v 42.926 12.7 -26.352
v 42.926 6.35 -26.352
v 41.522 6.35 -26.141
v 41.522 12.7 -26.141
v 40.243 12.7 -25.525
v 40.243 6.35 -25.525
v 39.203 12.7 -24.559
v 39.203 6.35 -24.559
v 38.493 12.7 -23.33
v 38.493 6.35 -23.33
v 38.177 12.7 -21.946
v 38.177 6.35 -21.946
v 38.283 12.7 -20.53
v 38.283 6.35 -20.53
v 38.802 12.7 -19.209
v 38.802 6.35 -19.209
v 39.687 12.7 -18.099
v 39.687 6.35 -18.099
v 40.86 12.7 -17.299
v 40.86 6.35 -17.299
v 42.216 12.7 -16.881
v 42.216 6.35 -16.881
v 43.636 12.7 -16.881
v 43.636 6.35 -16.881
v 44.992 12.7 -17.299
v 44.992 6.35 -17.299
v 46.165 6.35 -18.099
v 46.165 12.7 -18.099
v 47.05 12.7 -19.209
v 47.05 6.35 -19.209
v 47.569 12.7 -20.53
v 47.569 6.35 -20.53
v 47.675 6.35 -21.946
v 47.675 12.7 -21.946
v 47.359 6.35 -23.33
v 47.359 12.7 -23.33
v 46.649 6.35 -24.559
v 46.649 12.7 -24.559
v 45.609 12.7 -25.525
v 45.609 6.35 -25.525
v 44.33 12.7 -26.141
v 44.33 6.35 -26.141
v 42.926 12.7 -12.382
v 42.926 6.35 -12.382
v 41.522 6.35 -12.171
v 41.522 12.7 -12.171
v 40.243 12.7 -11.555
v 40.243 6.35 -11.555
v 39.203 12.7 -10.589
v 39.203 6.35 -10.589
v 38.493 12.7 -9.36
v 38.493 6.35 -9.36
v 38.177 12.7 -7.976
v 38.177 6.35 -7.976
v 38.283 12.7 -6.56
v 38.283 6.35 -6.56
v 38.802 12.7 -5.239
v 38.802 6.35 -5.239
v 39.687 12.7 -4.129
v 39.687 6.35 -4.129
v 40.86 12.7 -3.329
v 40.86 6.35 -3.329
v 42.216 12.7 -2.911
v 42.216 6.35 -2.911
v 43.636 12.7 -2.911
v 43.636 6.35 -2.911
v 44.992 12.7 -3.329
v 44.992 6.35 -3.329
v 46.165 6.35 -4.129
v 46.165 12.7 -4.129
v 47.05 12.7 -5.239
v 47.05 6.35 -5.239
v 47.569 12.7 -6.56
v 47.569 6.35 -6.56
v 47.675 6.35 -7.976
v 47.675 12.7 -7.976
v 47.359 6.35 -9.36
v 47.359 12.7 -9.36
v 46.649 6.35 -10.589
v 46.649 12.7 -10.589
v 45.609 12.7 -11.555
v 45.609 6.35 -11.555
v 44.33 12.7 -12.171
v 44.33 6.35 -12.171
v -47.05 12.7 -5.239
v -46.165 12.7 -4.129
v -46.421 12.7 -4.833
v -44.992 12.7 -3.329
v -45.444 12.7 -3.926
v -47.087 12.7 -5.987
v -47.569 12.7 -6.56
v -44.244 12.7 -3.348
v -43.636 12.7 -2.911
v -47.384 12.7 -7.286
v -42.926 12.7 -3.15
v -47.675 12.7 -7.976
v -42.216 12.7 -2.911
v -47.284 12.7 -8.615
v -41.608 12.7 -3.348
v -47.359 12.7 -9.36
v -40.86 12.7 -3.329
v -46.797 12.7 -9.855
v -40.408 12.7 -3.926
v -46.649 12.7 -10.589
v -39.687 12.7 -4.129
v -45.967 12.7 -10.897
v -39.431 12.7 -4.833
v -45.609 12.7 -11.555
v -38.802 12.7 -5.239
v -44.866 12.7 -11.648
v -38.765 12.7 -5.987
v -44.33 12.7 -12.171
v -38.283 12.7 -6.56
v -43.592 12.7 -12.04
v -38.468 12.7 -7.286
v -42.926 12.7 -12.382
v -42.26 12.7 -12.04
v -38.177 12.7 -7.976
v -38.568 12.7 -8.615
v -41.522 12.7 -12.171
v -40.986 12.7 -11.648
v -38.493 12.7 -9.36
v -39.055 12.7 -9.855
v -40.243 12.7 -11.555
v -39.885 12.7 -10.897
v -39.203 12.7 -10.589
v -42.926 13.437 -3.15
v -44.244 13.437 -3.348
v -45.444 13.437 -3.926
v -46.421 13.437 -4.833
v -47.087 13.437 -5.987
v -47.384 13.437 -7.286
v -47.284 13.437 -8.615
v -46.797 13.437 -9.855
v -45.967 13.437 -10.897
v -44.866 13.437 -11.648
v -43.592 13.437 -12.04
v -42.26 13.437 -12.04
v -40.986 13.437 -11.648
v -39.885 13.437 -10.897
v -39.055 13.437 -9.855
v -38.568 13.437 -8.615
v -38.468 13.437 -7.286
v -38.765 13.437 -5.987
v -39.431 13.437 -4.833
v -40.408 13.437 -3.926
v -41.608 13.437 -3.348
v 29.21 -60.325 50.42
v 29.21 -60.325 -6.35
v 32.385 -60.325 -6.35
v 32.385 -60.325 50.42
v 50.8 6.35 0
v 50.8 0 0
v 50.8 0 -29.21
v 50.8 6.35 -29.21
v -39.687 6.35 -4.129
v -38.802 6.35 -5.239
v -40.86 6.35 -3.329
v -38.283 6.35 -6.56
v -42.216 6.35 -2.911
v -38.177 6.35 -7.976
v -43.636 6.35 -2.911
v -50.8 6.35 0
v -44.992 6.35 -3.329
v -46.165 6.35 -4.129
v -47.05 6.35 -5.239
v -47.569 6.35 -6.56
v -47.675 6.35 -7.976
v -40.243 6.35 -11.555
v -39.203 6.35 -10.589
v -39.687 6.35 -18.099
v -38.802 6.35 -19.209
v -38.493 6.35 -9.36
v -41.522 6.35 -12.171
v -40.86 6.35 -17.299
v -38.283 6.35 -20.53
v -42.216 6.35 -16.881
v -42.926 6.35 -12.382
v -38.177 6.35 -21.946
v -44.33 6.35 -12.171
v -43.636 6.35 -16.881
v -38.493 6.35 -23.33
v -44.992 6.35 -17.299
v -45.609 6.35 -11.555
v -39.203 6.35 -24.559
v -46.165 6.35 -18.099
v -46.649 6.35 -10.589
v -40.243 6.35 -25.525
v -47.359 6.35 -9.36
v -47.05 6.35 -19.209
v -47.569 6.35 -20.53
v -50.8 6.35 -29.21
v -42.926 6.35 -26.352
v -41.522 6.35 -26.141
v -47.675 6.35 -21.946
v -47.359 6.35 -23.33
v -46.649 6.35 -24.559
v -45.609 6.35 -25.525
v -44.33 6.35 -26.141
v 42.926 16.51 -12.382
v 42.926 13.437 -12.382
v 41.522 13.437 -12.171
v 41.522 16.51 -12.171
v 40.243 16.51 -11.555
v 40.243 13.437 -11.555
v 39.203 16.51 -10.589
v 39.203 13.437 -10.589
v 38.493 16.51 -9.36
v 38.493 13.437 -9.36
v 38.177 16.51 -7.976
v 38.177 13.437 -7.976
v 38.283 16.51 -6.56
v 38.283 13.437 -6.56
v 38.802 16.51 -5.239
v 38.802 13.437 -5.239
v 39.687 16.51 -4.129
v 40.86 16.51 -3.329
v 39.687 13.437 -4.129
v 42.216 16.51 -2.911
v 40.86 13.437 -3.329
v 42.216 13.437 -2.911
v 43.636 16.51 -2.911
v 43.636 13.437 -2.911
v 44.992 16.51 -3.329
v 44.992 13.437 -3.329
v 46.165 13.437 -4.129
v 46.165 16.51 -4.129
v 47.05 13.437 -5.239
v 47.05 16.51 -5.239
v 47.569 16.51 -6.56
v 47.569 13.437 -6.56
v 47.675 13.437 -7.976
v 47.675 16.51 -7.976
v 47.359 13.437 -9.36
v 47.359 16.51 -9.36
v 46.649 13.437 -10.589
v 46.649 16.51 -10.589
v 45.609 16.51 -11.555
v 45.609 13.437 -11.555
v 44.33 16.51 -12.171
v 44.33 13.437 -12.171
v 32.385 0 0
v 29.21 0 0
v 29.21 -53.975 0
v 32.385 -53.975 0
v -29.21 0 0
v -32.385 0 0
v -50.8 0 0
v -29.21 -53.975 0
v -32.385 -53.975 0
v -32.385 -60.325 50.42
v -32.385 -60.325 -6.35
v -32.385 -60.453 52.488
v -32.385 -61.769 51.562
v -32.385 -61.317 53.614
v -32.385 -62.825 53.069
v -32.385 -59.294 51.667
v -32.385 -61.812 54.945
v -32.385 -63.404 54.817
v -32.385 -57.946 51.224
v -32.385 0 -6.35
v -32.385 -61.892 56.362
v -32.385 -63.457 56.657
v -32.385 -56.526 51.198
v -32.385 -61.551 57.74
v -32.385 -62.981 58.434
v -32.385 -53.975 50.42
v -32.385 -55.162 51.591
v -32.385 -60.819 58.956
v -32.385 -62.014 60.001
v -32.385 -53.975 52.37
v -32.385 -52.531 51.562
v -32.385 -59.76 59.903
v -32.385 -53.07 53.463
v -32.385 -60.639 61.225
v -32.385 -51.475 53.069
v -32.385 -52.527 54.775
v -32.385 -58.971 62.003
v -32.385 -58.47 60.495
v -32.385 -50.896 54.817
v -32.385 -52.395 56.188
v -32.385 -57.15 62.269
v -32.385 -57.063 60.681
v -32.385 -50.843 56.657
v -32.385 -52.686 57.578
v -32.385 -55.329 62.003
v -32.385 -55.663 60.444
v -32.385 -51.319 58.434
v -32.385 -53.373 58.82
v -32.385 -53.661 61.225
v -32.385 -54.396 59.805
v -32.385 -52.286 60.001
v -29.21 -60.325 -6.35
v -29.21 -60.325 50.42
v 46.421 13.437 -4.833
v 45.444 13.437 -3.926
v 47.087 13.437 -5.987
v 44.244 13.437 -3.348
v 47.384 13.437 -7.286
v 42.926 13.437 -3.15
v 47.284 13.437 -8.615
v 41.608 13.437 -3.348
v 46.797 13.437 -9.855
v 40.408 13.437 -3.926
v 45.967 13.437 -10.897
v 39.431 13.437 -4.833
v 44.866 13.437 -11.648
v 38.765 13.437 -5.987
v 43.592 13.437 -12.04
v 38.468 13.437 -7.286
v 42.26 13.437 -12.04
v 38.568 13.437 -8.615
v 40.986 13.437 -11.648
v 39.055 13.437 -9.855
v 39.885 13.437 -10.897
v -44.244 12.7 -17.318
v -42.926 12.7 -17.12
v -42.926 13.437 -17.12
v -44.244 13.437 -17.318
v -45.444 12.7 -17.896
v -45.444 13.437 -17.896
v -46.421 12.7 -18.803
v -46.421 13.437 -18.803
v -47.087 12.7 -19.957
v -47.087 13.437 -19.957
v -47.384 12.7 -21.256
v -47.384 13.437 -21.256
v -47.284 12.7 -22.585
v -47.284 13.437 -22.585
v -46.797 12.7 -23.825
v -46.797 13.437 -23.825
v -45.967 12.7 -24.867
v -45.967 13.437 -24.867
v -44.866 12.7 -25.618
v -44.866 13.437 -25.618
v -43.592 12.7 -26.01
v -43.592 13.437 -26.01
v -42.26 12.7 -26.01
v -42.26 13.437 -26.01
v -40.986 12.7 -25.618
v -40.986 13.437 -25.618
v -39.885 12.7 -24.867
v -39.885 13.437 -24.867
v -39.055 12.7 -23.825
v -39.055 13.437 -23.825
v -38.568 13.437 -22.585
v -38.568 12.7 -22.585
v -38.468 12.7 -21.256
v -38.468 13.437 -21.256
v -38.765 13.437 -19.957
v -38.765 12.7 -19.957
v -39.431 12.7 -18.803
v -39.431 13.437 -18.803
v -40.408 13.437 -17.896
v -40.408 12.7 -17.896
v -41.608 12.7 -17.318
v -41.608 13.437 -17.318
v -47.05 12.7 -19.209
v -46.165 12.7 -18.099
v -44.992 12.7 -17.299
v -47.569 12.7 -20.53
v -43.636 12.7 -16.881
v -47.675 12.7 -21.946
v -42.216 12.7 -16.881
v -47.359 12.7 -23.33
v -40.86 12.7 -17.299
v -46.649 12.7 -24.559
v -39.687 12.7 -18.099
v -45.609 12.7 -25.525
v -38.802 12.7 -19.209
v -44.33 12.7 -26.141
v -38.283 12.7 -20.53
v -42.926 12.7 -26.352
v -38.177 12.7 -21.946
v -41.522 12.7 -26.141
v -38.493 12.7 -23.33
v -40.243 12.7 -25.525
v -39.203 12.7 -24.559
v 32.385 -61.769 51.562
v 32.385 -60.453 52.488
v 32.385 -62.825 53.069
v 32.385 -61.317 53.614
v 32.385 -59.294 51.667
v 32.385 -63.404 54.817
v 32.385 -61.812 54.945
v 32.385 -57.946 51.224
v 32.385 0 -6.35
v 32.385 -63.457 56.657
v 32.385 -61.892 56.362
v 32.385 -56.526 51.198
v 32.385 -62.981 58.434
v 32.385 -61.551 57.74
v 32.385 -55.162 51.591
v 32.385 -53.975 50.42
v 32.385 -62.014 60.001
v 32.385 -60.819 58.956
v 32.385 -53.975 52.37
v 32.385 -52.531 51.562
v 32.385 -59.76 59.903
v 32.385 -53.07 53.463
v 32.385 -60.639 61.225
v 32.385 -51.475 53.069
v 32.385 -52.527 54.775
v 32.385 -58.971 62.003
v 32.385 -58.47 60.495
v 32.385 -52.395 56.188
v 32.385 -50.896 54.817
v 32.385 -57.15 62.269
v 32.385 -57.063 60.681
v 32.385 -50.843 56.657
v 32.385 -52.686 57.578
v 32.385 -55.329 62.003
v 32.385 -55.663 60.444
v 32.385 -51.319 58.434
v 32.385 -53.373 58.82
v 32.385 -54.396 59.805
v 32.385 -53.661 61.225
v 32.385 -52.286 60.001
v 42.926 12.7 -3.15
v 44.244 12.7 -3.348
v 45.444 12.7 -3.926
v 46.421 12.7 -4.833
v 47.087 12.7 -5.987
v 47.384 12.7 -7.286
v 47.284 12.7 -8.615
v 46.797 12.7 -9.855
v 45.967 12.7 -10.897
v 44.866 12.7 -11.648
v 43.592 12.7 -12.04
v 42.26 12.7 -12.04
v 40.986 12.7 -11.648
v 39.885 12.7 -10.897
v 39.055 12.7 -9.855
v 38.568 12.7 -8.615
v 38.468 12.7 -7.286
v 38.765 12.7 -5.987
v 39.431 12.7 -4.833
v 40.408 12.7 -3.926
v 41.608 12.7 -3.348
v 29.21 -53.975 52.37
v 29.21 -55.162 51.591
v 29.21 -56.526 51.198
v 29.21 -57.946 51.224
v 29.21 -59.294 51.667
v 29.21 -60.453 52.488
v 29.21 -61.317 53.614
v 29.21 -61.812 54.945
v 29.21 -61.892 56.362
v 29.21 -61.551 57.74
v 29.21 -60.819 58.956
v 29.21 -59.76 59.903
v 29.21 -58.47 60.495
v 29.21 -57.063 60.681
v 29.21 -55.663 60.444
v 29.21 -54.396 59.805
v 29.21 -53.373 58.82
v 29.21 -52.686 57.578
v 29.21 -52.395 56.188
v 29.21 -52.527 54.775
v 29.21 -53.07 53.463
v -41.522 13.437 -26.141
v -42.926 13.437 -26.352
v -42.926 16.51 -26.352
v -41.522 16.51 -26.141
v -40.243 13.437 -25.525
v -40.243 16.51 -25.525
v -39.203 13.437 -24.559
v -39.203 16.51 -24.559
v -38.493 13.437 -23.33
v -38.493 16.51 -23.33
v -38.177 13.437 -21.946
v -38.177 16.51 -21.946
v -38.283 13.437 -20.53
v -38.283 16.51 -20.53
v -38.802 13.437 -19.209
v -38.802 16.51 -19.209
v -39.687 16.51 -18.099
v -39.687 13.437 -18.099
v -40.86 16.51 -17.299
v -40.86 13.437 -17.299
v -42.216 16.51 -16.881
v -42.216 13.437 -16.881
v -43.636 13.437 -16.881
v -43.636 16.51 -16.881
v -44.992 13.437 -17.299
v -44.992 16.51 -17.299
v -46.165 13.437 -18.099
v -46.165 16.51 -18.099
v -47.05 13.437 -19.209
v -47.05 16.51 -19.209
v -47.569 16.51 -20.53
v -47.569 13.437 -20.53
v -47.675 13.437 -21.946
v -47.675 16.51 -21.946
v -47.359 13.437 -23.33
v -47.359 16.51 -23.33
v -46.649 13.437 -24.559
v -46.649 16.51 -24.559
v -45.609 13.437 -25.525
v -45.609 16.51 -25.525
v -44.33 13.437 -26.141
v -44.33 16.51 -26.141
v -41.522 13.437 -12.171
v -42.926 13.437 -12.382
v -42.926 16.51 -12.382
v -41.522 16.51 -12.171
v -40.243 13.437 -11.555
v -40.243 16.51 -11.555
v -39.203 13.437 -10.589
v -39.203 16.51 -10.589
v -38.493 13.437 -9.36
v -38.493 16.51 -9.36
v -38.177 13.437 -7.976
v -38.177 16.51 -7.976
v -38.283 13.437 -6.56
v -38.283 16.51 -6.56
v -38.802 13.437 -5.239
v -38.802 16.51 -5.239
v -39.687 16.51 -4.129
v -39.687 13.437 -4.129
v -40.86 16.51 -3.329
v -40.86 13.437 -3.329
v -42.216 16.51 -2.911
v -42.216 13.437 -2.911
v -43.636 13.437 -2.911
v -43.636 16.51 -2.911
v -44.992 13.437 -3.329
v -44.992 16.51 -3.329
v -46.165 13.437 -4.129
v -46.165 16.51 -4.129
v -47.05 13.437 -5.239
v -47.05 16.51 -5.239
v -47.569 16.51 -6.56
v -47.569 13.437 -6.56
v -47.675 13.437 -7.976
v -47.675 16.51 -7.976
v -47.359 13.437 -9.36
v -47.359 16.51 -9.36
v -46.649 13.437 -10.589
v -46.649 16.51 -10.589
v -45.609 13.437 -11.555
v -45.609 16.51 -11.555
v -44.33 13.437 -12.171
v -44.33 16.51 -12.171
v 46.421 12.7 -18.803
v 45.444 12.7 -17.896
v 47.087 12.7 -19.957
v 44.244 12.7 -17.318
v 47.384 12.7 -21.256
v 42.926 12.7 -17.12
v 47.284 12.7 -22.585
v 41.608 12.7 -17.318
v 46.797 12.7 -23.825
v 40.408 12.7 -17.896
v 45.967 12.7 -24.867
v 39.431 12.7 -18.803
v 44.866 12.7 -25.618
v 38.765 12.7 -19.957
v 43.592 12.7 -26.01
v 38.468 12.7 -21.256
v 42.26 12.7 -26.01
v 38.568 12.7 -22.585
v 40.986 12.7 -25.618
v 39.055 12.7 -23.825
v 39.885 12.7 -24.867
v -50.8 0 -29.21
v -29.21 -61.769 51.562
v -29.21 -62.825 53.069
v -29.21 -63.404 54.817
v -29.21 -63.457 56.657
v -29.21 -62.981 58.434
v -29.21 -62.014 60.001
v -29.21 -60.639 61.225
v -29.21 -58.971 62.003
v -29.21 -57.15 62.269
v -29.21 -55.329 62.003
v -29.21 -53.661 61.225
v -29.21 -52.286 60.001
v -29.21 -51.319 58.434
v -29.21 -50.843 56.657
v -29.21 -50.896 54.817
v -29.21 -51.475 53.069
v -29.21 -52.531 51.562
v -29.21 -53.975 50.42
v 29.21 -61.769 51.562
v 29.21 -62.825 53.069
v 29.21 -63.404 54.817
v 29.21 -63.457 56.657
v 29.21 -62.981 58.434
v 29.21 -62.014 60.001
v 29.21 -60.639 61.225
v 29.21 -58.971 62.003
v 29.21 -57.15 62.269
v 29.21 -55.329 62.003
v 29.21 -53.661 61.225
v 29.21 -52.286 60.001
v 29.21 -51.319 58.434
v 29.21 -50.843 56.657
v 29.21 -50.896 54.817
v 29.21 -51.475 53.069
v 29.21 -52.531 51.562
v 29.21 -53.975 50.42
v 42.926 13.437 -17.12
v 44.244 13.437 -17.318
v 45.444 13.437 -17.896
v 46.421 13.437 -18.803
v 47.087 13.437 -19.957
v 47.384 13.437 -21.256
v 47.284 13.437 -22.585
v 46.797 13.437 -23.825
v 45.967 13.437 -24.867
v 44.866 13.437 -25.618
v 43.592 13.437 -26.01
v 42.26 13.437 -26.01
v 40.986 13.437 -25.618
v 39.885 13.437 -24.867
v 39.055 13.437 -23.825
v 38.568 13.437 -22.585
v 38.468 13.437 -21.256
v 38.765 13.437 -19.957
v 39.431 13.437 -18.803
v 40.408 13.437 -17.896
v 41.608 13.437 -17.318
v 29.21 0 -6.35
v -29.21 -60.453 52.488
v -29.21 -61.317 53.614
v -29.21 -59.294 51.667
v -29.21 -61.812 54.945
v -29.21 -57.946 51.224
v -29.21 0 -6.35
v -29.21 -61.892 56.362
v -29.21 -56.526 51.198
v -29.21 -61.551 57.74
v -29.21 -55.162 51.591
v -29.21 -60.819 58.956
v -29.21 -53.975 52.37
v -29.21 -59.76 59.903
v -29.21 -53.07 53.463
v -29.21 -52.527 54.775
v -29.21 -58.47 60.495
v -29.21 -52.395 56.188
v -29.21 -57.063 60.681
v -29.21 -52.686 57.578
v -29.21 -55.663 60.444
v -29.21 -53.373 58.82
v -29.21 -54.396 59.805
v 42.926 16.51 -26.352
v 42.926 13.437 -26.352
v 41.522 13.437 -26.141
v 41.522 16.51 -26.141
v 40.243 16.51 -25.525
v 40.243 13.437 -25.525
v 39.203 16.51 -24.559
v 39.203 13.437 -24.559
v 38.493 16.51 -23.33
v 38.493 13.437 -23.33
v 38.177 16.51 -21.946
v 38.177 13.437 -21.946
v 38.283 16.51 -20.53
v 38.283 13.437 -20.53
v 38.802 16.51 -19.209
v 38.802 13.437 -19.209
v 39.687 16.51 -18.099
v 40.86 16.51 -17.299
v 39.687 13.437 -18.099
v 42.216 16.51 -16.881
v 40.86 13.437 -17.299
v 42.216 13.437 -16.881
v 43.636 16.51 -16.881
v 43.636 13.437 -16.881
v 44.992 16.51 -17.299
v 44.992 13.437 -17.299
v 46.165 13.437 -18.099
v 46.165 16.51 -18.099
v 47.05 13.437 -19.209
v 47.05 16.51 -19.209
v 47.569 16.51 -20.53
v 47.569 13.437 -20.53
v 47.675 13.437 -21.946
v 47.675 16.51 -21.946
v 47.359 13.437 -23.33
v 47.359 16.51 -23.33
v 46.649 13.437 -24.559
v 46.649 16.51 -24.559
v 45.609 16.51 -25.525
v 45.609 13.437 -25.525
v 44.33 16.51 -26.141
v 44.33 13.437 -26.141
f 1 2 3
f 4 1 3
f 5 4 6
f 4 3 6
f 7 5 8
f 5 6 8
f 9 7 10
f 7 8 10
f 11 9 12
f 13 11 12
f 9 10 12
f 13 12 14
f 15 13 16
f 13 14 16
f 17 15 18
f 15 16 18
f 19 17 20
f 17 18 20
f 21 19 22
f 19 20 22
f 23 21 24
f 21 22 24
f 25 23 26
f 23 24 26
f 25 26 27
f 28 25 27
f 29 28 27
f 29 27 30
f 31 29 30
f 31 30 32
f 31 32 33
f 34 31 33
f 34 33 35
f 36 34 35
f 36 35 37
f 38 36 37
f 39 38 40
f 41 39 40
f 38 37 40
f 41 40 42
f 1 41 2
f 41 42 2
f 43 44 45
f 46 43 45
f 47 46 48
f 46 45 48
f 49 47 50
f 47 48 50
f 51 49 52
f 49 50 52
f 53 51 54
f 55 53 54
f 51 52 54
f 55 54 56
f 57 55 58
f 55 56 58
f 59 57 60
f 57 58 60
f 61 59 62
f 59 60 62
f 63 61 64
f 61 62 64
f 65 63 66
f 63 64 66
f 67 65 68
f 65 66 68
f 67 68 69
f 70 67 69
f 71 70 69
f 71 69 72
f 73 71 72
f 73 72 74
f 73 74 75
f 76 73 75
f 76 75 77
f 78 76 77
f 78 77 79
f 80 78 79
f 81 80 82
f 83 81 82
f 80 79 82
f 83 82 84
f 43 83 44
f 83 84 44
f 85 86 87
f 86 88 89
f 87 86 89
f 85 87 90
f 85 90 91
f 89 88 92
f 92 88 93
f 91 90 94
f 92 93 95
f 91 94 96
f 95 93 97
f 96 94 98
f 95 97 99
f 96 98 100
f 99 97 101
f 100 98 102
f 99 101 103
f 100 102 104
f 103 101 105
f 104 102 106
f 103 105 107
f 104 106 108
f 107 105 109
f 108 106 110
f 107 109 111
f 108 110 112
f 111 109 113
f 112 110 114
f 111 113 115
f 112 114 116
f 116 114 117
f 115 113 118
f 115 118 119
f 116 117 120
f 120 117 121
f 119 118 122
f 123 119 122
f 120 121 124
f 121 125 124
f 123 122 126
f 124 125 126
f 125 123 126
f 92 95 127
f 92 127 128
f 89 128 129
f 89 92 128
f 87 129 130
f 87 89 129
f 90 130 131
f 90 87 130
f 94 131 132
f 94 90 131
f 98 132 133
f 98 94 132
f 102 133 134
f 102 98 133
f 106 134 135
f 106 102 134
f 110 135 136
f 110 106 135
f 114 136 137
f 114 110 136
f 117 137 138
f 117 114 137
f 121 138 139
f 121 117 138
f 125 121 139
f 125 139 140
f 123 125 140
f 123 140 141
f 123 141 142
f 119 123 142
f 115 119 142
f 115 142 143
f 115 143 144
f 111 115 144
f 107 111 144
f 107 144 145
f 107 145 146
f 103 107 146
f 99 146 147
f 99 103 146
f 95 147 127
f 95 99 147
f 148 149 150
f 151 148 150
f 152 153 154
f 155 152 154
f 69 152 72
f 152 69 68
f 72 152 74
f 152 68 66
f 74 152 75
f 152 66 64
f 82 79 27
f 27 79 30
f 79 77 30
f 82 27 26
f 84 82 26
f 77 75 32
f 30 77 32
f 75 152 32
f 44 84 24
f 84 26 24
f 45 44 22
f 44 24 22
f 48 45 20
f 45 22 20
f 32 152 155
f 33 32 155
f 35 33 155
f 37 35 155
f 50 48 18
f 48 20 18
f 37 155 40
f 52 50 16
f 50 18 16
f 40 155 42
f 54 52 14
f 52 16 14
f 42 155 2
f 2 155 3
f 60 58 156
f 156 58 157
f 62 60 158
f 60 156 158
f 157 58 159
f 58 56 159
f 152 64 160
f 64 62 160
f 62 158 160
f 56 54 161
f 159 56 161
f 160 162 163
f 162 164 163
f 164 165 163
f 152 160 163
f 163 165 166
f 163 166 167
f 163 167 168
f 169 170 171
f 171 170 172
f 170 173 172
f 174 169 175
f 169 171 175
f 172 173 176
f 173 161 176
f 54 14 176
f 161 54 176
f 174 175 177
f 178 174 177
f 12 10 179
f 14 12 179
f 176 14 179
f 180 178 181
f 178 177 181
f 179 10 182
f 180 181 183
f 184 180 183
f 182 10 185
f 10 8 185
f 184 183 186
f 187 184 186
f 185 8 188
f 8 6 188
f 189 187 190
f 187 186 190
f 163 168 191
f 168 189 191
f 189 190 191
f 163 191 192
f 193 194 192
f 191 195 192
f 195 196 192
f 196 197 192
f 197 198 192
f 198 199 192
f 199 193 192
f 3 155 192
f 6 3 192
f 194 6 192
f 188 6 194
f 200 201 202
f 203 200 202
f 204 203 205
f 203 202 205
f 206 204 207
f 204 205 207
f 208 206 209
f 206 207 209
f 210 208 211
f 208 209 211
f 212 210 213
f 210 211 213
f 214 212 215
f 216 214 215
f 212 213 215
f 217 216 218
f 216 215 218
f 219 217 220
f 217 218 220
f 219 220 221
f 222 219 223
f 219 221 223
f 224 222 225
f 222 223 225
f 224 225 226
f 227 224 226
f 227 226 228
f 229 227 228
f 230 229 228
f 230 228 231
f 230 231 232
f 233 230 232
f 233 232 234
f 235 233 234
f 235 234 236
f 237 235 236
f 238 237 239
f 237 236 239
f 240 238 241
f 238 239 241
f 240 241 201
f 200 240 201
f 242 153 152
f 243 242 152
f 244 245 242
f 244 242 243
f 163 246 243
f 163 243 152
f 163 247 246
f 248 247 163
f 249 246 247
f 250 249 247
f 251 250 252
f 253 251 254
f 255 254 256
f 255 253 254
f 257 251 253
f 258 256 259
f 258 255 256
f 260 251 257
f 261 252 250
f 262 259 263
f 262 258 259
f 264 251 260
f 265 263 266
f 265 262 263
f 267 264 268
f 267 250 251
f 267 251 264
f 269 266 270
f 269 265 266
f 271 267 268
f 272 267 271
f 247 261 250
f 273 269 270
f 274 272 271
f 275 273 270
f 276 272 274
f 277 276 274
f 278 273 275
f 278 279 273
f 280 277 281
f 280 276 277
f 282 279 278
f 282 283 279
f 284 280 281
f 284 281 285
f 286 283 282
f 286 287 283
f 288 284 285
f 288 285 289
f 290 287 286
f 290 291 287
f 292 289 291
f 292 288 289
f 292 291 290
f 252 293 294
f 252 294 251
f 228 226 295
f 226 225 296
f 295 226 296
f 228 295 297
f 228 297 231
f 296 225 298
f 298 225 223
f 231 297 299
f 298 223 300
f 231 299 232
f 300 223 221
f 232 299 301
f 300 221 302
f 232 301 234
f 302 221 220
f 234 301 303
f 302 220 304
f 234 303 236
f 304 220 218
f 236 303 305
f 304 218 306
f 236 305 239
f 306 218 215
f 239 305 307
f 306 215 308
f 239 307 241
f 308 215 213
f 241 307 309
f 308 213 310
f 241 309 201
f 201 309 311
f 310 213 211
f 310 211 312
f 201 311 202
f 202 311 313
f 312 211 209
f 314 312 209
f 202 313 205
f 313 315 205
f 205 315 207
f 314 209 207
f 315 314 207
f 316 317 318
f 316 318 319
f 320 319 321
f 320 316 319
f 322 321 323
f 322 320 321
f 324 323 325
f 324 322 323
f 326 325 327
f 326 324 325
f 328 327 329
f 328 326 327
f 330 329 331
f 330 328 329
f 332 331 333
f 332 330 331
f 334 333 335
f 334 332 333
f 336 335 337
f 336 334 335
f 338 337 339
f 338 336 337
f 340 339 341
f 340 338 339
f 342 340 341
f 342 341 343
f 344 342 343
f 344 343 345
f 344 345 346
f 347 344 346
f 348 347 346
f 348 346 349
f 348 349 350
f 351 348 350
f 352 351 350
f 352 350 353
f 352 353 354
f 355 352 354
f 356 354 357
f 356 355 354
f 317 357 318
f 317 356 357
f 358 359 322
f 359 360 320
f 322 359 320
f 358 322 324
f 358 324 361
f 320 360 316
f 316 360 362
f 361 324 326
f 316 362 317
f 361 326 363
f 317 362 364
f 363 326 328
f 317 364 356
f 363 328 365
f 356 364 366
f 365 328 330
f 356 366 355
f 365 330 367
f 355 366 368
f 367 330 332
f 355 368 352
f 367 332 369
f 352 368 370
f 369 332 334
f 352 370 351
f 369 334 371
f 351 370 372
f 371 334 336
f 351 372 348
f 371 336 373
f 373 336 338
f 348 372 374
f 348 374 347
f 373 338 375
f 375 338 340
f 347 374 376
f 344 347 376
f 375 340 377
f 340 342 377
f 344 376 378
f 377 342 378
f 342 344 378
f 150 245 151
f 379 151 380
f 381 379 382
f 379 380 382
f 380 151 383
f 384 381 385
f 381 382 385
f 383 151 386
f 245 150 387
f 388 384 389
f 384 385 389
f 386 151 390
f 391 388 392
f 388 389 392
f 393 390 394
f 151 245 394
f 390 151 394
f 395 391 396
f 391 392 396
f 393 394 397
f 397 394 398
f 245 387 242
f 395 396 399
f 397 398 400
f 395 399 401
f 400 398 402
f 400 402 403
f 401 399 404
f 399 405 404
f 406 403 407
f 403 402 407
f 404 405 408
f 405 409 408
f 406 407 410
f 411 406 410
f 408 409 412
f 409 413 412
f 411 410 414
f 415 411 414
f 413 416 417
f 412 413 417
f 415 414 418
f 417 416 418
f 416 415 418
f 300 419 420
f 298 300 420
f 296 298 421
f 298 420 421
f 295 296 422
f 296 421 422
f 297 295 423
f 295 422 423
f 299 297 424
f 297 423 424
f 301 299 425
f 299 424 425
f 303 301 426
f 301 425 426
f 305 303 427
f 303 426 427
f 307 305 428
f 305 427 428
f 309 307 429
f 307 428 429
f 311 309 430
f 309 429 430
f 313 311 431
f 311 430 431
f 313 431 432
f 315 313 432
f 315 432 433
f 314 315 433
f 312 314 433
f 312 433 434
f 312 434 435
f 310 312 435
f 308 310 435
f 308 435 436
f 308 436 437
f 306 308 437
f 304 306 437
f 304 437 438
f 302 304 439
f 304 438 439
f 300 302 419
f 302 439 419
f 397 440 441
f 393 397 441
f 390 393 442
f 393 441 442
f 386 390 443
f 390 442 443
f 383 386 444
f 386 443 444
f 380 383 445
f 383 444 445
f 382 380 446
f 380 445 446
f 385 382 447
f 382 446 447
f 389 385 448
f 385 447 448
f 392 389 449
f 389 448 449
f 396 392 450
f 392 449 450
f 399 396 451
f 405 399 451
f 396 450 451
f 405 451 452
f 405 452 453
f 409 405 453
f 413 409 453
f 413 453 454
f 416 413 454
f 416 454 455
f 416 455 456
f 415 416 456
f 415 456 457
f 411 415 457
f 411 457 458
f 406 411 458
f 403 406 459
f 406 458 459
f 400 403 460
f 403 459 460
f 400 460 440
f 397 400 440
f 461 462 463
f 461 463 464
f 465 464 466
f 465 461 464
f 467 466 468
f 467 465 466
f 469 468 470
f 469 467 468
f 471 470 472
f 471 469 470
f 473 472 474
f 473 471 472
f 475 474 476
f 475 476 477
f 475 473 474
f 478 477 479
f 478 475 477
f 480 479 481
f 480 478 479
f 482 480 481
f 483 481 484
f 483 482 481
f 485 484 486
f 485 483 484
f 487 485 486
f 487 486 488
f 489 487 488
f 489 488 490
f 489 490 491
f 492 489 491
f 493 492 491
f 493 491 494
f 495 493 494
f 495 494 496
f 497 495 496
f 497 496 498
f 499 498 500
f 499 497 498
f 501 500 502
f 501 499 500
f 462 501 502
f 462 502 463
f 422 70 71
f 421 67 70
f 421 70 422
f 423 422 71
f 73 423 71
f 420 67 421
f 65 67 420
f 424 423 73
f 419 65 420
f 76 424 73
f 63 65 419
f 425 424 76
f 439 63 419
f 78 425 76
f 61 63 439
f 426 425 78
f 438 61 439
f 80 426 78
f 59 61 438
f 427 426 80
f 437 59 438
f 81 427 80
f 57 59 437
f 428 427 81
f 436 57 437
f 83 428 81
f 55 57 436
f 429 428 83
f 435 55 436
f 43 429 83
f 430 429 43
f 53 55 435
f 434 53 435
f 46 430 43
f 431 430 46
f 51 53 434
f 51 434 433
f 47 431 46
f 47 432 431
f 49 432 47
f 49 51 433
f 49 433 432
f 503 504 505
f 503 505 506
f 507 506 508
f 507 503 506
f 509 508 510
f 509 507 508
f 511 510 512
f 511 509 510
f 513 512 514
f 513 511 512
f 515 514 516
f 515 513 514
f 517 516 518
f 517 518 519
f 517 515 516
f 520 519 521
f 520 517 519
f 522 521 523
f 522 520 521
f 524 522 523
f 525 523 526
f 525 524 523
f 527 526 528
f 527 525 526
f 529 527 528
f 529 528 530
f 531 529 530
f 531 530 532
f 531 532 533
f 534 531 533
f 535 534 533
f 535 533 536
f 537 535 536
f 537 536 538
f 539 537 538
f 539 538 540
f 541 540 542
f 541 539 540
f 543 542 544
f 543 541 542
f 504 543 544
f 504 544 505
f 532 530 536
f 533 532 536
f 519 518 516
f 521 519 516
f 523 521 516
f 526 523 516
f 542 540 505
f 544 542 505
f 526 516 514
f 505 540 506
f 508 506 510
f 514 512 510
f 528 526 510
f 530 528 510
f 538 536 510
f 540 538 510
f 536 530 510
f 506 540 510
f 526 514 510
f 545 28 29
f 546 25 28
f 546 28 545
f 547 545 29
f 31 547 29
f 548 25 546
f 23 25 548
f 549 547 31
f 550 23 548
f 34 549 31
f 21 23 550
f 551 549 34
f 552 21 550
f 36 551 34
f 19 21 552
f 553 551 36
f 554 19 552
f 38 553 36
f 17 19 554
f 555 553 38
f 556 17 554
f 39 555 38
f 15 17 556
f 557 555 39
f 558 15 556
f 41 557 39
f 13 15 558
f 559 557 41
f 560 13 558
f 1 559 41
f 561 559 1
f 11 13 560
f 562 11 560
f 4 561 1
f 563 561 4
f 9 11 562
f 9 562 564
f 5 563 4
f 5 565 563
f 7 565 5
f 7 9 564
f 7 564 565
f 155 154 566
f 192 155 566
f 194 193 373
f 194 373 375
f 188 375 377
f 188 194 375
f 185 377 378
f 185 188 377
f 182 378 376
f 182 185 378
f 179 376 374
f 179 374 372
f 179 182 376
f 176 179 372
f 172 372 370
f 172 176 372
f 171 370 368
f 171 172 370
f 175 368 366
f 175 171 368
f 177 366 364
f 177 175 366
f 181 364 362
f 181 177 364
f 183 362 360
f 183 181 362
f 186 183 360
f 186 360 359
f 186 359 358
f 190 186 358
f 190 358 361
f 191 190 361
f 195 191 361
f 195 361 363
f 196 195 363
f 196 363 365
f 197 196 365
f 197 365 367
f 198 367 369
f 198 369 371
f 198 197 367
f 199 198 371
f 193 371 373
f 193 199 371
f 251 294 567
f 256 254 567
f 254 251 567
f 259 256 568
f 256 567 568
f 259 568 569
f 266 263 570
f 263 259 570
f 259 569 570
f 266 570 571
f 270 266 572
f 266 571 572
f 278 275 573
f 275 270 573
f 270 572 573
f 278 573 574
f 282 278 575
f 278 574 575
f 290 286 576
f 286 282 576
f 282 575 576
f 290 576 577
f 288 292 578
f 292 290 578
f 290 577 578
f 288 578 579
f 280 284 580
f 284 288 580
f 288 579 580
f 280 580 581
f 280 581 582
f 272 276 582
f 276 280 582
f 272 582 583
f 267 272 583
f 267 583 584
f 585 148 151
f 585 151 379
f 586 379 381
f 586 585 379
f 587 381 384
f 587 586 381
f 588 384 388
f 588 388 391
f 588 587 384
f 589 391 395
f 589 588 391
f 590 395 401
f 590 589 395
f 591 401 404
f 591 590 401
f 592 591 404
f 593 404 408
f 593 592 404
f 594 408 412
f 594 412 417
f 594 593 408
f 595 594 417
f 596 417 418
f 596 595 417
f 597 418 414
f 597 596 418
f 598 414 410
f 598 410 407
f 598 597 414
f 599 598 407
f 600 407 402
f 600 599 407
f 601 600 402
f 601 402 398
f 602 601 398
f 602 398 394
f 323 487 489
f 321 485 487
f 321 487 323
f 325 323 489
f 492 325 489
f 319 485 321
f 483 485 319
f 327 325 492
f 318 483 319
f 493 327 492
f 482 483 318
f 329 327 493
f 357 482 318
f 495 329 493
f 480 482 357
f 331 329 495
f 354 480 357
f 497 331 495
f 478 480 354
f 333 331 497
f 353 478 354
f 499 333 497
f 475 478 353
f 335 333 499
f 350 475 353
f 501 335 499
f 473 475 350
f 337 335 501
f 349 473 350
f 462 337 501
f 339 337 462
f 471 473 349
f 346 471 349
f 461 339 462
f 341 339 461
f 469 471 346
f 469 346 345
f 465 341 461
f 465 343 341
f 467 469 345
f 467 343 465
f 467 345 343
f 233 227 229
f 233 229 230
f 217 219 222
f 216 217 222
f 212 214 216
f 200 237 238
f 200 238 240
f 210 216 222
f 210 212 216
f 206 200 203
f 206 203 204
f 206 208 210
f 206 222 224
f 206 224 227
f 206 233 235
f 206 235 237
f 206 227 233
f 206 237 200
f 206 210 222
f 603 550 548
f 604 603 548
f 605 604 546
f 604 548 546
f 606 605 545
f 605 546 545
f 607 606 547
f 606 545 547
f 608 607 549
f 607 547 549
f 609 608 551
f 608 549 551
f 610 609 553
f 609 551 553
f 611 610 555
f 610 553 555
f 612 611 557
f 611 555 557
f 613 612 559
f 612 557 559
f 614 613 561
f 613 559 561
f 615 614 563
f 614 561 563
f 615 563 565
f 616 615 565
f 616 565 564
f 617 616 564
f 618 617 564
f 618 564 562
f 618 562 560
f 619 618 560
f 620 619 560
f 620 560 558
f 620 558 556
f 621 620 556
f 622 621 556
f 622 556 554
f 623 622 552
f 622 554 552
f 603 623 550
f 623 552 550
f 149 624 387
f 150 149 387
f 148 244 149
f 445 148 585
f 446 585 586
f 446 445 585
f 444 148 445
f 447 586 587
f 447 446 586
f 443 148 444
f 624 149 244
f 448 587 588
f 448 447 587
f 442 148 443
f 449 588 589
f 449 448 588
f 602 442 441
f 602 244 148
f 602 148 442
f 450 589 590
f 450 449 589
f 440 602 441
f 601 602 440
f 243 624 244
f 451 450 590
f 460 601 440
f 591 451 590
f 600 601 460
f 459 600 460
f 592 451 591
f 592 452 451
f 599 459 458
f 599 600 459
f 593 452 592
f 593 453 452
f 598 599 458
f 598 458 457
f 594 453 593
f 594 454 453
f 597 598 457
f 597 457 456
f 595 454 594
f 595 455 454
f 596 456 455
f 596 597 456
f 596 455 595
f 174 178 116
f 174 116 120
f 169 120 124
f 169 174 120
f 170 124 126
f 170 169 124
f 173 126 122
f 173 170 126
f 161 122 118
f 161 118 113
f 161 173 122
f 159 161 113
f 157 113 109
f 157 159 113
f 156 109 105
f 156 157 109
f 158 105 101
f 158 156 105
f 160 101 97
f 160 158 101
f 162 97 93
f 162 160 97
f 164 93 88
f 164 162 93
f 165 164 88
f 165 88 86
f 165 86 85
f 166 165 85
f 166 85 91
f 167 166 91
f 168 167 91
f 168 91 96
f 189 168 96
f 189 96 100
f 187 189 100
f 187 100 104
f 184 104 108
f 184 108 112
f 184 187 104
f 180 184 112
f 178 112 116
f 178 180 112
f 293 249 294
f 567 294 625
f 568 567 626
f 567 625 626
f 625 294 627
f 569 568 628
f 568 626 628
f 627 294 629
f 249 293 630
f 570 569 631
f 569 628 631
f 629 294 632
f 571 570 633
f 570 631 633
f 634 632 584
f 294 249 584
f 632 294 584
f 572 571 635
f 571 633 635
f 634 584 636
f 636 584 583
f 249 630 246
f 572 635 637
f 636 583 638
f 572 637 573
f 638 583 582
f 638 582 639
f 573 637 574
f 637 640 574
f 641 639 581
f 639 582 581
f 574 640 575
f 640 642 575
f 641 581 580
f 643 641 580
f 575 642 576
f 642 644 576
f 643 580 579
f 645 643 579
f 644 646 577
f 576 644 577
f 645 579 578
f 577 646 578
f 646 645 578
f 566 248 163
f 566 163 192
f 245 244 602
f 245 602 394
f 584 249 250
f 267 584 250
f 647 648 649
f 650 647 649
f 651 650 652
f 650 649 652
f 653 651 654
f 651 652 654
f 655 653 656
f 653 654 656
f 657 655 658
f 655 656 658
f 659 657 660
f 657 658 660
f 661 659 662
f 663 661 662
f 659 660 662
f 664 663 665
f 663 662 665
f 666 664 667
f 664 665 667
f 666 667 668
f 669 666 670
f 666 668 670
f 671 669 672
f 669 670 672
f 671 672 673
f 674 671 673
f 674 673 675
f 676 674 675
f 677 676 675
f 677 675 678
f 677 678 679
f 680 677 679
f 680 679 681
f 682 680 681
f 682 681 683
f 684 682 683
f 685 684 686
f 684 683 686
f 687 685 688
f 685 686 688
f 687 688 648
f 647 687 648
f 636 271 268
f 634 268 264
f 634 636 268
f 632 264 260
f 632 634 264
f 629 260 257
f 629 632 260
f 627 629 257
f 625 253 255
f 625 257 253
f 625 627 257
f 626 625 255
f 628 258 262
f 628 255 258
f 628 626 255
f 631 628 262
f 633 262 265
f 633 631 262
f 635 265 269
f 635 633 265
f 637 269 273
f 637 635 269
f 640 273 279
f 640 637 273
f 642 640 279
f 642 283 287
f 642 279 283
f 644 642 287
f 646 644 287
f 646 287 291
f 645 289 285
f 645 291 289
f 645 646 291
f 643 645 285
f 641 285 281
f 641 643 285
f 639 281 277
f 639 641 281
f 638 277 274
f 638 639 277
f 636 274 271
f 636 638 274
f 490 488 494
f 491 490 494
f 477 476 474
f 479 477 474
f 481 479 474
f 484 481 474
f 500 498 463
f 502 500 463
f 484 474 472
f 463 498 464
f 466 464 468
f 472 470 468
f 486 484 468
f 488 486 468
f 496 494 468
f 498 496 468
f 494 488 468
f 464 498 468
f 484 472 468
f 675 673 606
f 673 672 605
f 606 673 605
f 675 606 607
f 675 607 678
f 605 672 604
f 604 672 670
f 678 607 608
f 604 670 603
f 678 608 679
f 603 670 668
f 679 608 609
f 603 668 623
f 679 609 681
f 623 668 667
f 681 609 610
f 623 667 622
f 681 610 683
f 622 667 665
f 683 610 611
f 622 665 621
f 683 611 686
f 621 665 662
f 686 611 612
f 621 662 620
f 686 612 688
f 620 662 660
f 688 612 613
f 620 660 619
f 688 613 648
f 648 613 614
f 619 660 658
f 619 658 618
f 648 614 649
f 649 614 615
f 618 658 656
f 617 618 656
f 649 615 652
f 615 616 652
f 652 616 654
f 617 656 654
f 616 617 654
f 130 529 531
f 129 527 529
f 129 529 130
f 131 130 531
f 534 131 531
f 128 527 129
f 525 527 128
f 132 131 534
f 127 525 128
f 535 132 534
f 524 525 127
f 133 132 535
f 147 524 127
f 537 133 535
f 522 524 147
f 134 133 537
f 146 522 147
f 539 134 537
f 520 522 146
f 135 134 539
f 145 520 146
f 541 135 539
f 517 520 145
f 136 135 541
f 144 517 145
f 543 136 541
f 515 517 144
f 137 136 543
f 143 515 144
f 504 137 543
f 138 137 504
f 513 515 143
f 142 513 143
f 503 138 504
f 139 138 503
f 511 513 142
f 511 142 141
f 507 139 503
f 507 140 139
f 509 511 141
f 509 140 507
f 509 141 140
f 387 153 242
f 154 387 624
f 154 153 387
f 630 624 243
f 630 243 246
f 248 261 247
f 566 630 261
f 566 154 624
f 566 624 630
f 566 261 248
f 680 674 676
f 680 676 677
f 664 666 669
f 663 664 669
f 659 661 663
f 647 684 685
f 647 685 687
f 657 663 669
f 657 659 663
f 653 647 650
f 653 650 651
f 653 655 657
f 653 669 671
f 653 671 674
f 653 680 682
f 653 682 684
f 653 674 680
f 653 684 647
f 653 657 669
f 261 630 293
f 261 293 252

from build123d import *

# Parameters (mm, degrees)
SKETCH2_W           = 50.8
SKETCH2_H           = 29.21
BOSS_EXTRUDE1_DEPTH = 6.35
SKETCH4_R           = 4.7625
BOSS_EXTRUDE2_DEPTH = 6.35
SKETCH7_R           = 4.4704
BOSS_EXTRUDE3_DEPTH = 0.7366
SKETCH8_R           = 4.7625
BOSS_EXTRUDE4_DEPTH = 3.0734
SKETCH11_W          = 3.175
SKETCH11_H          = 6.35
BOSS_EXTRUDE5_DEPTH = 60.325
SKETCH12_W          = 3.175
SKETCH12_H          = 6.35
BOSS_EXTRUDE6_DEPTH = 55.91937
SKETCH13_R          = 6.35
SKETCH13_R_2        = 4.7625
BOSS_EXTRUDE8_DEPTH = 3.175
SKETCH17_R          = 4.7625
CUT_EXTRUDE3_DEPTH  = 3.175


with BuildPart() as part:
    # Sketch2 → Boss-Extrude1 (new body)
    with BuildSketch(Plane(origin=(0, 0, 0), x_dir=(1, 0, 0), z_dir=(0, 1, 0))):
        with Locations((25.4, 14.605)):
            Rectangle(SKETCH2_W, SKETCH2_H)
    boss_extrude1 = extrude(amount=BOSS_EXTRUDE1_DEPTH)

    # Sketch4 → Boss-Extrude2 (add)
    with BuildSketch(Plane(origin=(0, 6.35, 0), x_dir=(1, 0, 0), z_dir=(0, 1, 0))):
        with Locations(Location((42.926, 7.62, 0), (0, 0, 90))):
            Circle(SKETCH4_R)
        with Locations(Location((42.926, 21.59, 0), (0, 0, 90))):
            Circle(SKETCH4_R)
    boss_extrude2 = extrude(amount=BOSS_EXTRUDE2_DEPTH)

    # Sketch7 → Boss-Extrude3 (add)
    with BuildSketch(Plane(origin=(0, 12.7, 0), x_dir=(1, 0, 0), z_dir=(0, 1, 0))):
        with Locations(Location((42.926, 21.59, 0), (0, 0, 270))):
            Circle(SKETCH7_R)
        with Locations(Location((42.926, 7.62, 0), (0, 0, 270))):
            Circle(SKETCH7_R)
    boss_extrude3 = extrude(amount=BOSS_EXTRUDE3_DEPTH)

    # Sketch8 → Boss-Extrude4 (add)
    with BuildSketch(Plane(origin=(0, 13.4366, 0), x_dir=(1, 0, 0), z_dir=(0, 1, 0))):
        with Locations(Location((42.926, 21.59, 0), (0, 0, 90))):
            Circle(SKETCH8_R)
        with Locations(Location((42.926, 7.62, 0), (0, 0, 90))):
            Circle(SKETCH8_R)
    boss_extrude4 = extrude(amount=BOSS_EXTRUDE4_DEPTH)

    # Sketch11 → Boss-Extrude5 (add)
    with BuildSketch(Plane.XZ):
        with Locations((30.7975, -3.175)):
            Rectangle(SKETCH11_W, SKETCH11_H)
    boss_extrude5 = extrude(amount=BOSS_EXTRUDE5_DEPTH)

    # Sketch12 → Boss-Extrude6 (add)
    with BuildSketch(Plane.XY):
        with Locations((30.7975, -57.15)):
            Rectangle(SKETCH12_W, SKETCH12_H)
    boss_extrude6 = extrude(amount=BOSS_EXTRUDE6_DEPTH)

    # Sketch13 → Boss-Extrude8 (add)
    with BuildSketch(Plane.ZY.offset(-29.21)):
        with Locations((55.91937, -57.15)):
            Circle(SKETCH13_R)
        with Locations((55.91937, -57.15)):
            Circle(SKETCH13_R_2, mode=Mode.SUBTRACT)
    boss_extrude8 = extrude(amount=-BOSS_EXTRUDE8_DEPTH)

    # Sketch17 → Cut-Extrude3 (cut)
    with BuildSketch(Plane.ZY.offset(-29.21)):
        with Locations((55.91937, -57.15)):
            Circle(SKETCH17_R)
    cut_extrude3 = extrude(amount=-CUT_EXTRUDE3_DEPTH, mode=Mode.SUBTRACT)

    # Mirror3: Boss-Extrude1, Boss-Extrude2, Boss-Extrude3, Boss-Extrude4, Boss-Extrude5, Boss-Extrude6, Boss-Extrude8, Cut-Extrude3 across plane
    add(boss_extrude1.mirror(Plane(origin=(0, 0, 0), x_dir=(0, 0, 1), z_dir=(1, 0, 0))))
    add(boss_extrude2.mirror(Plane(origin=(0, 0, 0), x_dir=(0, 0, 1), z_dir=(1, 0, 0))))
    add(boss_extrude3.mirror(Plane(origin=(0, 0, 0), x_dir=(0, 0, 1), z_dir=(1, 0, 0))))
    add(boss_extrude4.mirror(Plane(origin=(0, 0, 0), x_dir=(0, 0, 1), z_dir=(1, 0, 0))))
    add(boss_extrude5.mirror(Plane(origin=(0, 0, 0), x_dir=(0, 0, 1), z_dir=(1, 0, 0))))
    add(boss_extrude6.mirror(Plane(origin=(0, 0, 0), x_dir=(0, 0, 1), z_dir=(1, 0, 0))))
    add(boss_extrude8.mirror(Plane(origin=(0, 0, 0), x_dir=(0, 0, 1), z_dir=(1, 0, 0))))
    add(cut_extrude3.mirror(Plane(origin=(0, 0, 0), x_dir=(0, 0, 1), z_dir=(1, 0, 0))), mode=Mode.SUBTRACT)


solid = part.part
